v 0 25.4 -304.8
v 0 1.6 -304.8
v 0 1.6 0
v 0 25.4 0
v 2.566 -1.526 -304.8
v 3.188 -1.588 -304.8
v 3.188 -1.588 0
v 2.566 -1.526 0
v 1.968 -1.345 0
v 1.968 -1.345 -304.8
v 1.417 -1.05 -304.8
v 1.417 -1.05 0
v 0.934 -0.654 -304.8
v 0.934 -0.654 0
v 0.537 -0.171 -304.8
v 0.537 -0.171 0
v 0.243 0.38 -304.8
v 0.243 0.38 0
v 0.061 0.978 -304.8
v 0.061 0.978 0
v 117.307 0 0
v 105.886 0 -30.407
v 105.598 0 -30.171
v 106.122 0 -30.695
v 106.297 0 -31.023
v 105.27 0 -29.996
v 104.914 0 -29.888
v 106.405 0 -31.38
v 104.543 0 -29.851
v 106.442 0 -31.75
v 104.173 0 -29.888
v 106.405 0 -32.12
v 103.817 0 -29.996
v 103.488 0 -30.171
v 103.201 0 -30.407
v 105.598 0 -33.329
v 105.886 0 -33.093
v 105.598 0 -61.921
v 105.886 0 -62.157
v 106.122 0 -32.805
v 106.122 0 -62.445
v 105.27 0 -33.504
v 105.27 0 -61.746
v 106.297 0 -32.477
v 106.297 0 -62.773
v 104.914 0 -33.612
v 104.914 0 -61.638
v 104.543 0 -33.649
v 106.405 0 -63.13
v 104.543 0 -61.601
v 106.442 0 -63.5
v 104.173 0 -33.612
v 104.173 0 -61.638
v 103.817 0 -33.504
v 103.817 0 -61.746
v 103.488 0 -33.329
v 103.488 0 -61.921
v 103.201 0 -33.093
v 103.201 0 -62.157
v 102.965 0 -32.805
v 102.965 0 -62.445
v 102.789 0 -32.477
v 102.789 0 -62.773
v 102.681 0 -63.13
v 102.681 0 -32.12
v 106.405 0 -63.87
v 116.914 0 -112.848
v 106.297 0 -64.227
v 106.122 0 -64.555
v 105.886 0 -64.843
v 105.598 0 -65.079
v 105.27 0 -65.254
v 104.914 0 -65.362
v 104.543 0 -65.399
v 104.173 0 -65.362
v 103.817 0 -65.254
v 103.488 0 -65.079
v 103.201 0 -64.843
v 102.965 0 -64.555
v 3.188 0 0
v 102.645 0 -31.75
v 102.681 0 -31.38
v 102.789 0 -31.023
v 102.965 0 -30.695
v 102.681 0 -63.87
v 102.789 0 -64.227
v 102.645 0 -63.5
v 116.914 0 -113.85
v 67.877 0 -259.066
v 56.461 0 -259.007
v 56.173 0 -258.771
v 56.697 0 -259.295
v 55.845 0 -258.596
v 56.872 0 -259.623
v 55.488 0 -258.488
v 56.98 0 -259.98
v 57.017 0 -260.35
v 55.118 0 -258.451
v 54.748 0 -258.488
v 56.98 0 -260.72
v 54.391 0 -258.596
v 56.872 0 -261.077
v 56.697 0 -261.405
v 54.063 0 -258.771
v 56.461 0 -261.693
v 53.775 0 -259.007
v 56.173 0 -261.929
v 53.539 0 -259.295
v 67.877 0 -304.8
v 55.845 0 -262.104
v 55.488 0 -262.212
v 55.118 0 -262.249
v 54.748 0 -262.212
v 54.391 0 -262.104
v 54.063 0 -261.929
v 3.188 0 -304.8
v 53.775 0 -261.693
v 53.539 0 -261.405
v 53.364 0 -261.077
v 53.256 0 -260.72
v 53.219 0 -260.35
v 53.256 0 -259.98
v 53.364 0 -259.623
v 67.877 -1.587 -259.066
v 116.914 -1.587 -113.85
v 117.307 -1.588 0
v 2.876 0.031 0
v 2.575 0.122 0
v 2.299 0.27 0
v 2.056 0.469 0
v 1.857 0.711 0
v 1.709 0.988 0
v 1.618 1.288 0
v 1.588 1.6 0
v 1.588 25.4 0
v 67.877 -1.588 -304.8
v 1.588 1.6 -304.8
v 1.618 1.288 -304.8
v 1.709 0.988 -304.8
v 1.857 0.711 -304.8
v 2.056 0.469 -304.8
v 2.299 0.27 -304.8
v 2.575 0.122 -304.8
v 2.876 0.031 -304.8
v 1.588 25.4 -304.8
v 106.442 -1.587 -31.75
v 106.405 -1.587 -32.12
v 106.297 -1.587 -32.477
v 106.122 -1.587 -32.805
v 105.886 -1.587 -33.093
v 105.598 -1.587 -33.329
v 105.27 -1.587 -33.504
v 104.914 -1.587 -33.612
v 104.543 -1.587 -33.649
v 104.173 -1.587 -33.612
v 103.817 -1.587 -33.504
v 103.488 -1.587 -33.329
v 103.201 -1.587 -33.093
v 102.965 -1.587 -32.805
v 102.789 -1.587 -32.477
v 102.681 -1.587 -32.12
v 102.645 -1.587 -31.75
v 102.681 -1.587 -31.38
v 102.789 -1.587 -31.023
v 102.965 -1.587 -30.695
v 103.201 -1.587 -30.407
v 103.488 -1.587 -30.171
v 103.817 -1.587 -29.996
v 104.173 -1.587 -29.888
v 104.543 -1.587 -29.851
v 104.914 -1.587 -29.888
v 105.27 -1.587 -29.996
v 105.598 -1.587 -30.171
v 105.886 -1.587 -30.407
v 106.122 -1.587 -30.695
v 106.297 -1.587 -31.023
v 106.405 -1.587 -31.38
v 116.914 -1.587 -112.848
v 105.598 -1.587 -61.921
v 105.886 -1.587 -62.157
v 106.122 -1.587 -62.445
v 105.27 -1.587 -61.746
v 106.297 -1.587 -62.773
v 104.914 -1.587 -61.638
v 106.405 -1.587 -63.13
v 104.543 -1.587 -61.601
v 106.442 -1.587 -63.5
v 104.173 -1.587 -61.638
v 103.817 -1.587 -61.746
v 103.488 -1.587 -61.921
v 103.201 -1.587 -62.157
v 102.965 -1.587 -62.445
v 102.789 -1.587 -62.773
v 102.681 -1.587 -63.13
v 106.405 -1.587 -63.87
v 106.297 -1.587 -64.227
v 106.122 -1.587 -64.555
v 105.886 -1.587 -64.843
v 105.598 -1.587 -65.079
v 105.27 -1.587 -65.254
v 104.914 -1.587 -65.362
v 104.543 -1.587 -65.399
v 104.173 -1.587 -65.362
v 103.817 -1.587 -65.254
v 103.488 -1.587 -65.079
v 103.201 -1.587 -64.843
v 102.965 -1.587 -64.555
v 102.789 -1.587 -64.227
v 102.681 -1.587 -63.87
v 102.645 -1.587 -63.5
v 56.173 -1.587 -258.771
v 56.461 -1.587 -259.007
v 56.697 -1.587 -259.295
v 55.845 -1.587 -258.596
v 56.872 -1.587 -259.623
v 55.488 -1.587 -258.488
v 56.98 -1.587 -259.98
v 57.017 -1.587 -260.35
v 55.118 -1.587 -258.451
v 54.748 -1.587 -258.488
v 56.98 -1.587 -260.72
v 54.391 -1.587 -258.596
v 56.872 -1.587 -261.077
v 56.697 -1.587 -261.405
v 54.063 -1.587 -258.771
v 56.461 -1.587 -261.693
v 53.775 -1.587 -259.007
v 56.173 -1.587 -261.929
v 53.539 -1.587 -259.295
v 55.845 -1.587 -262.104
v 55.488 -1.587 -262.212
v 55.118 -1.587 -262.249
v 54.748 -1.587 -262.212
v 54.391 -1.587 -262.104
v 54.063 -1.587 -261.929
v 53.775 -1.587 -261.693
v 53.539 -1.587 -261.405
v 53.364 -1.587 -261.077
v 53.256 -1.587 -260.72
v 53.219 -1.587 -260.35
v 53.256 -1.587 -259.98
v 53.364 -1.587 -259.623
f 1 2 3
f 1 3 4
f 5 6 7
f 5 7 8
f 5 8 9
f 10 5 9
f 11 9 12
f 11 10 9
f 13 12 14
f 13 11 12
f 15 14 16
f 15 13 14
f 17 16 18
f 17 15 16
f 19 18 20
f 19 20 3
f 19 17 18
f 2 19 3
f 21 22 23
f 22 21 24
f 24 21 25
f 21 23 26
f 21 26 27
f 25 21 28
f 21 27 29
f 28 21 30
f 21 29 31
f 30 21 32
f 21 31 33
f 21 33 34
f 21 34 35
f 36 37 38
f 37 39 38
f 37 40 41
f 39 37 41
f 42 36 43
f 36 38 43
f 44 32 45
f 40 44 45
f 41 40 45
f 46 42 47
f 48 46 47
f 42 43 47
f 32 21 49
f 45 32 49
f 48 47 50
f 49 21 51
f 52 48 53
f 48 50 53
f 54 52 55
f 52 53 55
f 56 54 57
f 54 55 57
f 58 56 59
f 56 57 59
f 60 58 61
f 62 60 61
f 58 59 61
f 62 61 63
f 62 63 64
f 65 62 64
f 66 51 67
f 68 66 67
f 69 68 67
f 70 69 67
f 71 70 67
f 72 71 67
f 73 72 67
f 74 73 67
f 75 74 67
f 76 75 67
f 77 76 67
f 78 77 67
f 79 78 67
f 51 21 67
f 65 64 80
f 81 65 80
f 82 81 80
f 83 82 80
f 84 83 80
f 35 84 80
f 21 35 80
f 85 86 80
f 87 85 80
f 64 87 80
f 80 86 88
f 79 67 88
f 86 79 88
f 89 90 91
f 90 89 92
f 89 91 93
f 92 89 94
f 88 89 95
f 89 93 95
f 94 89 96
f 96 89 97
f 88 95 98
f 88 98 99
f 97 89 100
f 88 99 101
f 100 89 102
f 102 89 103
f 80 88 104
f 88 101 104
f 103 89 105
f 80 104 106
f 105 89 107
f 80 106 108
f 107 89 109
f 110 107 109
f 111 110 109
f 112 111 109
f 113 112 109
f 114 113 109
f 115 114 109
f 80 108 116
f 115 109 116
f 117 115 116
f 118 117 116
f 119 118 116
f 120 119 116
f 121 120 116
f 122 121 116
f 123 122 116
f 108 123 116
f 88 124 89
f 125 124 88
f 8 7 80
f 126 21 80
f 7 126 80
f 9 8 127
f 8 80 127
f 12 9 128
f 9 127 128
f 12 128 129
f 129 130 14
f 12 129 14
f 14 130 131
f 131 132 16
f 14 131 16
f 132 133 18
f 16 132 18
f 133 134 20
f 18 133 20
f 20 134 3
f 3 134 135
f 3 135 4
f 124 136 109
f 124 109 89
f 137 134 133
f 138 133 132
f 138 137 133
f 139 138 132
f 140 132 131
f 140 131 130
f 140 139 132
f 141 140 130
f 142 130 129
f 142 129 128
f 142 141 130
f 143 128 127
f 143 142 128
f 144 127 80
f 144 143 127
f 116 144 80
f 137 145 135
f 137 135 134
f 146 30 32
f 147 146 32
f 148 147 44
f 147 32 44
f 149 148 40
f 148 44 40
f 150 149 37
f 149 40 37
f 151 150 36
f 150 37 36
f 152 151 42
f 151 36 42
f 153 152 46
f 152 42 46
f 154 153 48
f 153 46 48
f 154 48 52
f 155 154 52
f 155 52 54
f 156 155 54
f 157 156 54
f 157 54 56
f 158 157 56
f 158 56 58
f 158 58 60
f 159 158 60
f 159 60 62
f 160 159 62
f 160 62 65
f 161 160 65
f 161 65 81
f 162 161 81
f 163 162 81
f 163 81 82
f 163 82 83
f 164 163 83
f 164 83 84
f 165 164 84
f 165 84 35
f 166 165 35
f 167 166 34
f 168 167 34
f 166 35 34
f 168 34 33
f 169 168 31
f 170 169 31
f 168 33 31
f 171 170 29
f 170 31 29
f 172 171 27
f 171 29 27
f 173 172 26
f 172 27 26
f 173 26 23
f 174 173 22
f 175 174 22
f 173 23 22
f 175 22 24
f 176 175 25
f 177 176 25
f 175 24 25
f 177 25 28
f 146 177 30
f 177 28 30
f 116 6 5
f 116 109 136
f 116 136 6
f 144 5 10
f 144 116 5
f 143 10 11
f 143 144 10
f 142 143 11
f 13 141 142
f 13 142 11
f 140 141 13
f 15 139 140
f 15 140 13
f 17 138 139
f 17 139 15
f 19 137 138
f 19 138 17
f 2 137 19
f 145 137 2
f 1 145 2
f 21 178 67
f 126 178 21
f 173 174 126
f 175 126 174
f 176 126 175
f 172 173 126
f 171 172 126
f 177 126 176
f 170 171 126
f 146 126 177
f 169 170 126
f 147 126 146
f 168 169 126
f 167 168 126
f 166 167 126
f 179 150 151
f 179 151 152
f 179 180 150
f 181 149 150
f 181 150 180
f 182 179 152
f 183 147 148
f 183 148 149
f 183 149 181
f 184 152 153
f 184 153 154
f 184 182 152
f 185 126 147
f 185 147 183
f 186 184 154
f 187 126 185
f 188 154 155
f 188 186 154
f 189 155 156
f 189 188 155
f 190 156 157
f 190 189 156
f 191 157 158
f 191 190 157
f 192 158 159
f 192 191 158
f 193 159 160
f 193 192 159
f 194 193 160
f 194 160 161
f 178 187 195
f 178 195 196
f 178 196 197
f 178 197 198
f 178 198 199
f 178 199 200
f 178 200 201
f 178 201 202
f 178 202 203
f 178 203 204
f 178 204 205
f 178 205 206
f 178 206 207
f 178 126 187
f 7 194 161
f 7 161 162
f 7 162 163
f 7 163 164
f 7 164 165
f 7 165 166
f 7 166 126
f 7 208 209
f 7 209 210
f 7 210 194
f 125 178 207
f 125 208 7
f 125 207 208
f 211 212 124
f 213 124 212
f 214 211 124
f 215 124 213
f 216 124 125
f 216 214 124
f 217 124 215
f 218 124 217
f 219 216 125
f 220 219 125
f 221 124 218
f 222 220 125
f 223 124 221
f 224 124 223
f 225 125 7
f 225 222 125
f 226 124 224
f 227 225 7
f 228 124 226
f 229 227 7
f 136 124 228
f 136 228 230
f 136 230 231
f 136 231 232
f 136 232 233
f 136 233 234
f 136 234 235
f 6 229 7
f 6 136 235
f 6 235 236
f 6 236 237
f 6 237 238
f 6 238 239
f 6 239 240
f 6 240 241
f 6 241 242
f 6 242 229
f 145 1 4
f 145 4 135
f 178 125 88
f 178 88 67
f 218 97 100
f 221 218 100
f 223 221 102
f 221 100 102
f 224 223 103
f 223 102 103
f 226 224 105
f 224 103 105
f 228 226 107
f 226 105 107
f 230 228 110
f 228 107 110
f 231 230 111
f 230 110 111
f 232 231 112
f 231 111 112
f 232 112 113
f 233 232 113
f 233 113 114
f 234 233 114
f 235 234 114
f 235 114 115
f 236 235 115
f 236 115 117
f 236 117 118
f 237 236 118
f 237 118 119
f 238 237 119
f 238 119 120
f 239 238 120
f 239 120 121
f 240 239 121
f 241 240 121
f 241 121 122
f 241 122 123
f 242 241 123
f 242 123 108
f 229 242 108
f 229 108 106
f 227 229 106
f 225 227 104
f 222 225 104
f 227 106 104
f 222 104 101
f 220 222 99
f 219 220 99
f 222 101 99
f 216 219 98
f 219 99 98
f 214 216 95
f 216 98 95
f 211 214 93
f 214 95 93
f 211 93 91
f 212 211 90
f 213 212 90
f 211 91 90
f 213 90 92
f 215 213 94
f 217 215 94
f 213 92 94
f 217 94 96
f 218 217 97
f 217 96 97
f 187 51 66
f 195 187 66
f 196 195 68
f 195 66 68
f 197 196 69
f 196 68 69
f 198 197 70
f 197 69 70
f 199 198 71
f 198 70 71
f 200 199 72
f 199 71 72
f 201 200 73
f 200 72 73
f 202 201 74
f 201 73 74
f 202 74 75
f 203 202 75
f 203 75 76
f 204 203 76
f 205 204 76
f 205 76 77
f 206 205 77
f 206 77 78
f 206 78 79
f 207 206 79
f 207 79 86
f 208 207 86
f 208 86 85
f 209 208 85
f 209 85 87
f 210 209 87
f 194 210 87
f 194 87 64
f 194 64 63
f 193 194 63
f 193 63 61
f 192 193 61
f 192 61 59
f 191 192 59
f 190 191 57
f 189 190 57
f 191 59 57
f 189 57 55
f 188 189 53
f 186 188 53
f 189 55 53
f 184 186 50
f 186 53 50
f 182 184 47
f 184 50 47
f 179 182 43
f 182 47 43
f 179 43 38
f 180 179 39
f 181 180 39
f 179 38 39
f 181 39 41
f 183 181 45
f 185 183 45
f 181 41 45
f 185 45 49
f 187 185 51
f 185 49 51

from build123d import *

# Parameters (mm, degrees)
BASE_FLANGE1_DEPTH           = 1.5875
EDGE_FLANGE1_STRIP_W         = 9.5504
EDGE_FLANGE1_STRIP_H         = 1.5875
EDGE_FLANGE1_STRIP_CUT_DEPTH = 304.8
EDGE_FLANGE1_DEPTH           = 304.8
CUT_EXTRUDE1_DEPTH           = 342.722050796
CUT_EXTRUDE1_DEPTH_BACK      = 342.722050796
F_6_CLEARANCE_HOLE1_D        = 3.7973


# Sheet-metal steps are written as plain solids
with BuildPart() as part:
    # Sketch1 → Base-Flange1 (new body)
    with BuildSketch(Plane(origin=(0, 0, 0), x_dir=(1, 0, 0), z_dir=(0, 1, 0))):
        Polygon((0, 304.8), (76.2, 304.8), (152.4, 0), (0, 0), align=None)
    extrude(amount=-BASE_FLANGE1_DEPTH)

    # Edge-Flange1 strip (across the edge) → Edge-Flange1 strip cut (cut)
    with BuildSketch(Plane.XY.offset(-304.8)):
        with Locations((-1.5875, -0.79375)):
            Rectangle(EDGE_FLANGE1_STRIP_W, EDGE_FLANGE1_STRIP_H)
    extrude(amount=EDGE_FLANGE1_STRIP_CUT_DEPTH, mode=Mode.SUBTRACT)

    # Edge-Flange1 section (across the edge) → Edge-Flange1 (add)
    with BuildSketch(Plane.XY.offset(-304.8)):
        with BuildLine():
            Line((0, 1.6002), (0, 25.4))
            Line((0, 25.4), (1.5875, 25.4))
            Line((1.5875, 25.4), (1.5875, 1.6002))
            ThreePointArc((1.5875, 1.6002), (2.056187729, 0.468687729), (3.1877, 0))
            Line((3.1877, 0), (3.1877, -1.5875))
            ThreePointArc((3.1877, -1.5875), (0.933655714, -0.653844286), (0, 1.6002))
        make_face()
    extrude(amount=EDGE_FLANGE1_DEPTH)

    # Sketch10 → Cut-Extrude1 (cut, two sides: drawn at the far end of the back side and taken through both)
    with BuildSketch(Plane(origin=(0, 0, 0), x_dir=(1, 0, 0), z_dir=(0, 1, 0)).offset(-CUT_EXTRUDE1_DEPTH_BACK)):
        Polygon((67.87676626, 967.988947135), (67.87676626, 304.8), (67.87676626, 261.217419128), (67.87676626, 259.06565424), (116.914364331, 113.849879077), (116.914364331, 112.848219234), (117.306905871, 0), (119.613788846, -663.184934911), (1445.325011297, -621.136473854), (1393.587988711, 1010.037408193), align=None)
    extrude(amount=CUT_EXTRUDE1_DEPTH + CUT_EXTRUDE1_DEPTH_BACK, mode=Mode.SUBTRACT)

    # #6 Clearance Hole1 (through all)
    with Locations(Plane(origin=(0, -1.5875, 0), x_dir=(-1, 0, 0), z_dir=(0, -1, 0))):
        with Locations((-55.118000004, 260.349999989), (-104.543184669, 31.750000016), (-104.543184669, 63.500000016)):
            Hole(F_6_CLEARANCE_HOLE1_D / 2)


solid = part.part
